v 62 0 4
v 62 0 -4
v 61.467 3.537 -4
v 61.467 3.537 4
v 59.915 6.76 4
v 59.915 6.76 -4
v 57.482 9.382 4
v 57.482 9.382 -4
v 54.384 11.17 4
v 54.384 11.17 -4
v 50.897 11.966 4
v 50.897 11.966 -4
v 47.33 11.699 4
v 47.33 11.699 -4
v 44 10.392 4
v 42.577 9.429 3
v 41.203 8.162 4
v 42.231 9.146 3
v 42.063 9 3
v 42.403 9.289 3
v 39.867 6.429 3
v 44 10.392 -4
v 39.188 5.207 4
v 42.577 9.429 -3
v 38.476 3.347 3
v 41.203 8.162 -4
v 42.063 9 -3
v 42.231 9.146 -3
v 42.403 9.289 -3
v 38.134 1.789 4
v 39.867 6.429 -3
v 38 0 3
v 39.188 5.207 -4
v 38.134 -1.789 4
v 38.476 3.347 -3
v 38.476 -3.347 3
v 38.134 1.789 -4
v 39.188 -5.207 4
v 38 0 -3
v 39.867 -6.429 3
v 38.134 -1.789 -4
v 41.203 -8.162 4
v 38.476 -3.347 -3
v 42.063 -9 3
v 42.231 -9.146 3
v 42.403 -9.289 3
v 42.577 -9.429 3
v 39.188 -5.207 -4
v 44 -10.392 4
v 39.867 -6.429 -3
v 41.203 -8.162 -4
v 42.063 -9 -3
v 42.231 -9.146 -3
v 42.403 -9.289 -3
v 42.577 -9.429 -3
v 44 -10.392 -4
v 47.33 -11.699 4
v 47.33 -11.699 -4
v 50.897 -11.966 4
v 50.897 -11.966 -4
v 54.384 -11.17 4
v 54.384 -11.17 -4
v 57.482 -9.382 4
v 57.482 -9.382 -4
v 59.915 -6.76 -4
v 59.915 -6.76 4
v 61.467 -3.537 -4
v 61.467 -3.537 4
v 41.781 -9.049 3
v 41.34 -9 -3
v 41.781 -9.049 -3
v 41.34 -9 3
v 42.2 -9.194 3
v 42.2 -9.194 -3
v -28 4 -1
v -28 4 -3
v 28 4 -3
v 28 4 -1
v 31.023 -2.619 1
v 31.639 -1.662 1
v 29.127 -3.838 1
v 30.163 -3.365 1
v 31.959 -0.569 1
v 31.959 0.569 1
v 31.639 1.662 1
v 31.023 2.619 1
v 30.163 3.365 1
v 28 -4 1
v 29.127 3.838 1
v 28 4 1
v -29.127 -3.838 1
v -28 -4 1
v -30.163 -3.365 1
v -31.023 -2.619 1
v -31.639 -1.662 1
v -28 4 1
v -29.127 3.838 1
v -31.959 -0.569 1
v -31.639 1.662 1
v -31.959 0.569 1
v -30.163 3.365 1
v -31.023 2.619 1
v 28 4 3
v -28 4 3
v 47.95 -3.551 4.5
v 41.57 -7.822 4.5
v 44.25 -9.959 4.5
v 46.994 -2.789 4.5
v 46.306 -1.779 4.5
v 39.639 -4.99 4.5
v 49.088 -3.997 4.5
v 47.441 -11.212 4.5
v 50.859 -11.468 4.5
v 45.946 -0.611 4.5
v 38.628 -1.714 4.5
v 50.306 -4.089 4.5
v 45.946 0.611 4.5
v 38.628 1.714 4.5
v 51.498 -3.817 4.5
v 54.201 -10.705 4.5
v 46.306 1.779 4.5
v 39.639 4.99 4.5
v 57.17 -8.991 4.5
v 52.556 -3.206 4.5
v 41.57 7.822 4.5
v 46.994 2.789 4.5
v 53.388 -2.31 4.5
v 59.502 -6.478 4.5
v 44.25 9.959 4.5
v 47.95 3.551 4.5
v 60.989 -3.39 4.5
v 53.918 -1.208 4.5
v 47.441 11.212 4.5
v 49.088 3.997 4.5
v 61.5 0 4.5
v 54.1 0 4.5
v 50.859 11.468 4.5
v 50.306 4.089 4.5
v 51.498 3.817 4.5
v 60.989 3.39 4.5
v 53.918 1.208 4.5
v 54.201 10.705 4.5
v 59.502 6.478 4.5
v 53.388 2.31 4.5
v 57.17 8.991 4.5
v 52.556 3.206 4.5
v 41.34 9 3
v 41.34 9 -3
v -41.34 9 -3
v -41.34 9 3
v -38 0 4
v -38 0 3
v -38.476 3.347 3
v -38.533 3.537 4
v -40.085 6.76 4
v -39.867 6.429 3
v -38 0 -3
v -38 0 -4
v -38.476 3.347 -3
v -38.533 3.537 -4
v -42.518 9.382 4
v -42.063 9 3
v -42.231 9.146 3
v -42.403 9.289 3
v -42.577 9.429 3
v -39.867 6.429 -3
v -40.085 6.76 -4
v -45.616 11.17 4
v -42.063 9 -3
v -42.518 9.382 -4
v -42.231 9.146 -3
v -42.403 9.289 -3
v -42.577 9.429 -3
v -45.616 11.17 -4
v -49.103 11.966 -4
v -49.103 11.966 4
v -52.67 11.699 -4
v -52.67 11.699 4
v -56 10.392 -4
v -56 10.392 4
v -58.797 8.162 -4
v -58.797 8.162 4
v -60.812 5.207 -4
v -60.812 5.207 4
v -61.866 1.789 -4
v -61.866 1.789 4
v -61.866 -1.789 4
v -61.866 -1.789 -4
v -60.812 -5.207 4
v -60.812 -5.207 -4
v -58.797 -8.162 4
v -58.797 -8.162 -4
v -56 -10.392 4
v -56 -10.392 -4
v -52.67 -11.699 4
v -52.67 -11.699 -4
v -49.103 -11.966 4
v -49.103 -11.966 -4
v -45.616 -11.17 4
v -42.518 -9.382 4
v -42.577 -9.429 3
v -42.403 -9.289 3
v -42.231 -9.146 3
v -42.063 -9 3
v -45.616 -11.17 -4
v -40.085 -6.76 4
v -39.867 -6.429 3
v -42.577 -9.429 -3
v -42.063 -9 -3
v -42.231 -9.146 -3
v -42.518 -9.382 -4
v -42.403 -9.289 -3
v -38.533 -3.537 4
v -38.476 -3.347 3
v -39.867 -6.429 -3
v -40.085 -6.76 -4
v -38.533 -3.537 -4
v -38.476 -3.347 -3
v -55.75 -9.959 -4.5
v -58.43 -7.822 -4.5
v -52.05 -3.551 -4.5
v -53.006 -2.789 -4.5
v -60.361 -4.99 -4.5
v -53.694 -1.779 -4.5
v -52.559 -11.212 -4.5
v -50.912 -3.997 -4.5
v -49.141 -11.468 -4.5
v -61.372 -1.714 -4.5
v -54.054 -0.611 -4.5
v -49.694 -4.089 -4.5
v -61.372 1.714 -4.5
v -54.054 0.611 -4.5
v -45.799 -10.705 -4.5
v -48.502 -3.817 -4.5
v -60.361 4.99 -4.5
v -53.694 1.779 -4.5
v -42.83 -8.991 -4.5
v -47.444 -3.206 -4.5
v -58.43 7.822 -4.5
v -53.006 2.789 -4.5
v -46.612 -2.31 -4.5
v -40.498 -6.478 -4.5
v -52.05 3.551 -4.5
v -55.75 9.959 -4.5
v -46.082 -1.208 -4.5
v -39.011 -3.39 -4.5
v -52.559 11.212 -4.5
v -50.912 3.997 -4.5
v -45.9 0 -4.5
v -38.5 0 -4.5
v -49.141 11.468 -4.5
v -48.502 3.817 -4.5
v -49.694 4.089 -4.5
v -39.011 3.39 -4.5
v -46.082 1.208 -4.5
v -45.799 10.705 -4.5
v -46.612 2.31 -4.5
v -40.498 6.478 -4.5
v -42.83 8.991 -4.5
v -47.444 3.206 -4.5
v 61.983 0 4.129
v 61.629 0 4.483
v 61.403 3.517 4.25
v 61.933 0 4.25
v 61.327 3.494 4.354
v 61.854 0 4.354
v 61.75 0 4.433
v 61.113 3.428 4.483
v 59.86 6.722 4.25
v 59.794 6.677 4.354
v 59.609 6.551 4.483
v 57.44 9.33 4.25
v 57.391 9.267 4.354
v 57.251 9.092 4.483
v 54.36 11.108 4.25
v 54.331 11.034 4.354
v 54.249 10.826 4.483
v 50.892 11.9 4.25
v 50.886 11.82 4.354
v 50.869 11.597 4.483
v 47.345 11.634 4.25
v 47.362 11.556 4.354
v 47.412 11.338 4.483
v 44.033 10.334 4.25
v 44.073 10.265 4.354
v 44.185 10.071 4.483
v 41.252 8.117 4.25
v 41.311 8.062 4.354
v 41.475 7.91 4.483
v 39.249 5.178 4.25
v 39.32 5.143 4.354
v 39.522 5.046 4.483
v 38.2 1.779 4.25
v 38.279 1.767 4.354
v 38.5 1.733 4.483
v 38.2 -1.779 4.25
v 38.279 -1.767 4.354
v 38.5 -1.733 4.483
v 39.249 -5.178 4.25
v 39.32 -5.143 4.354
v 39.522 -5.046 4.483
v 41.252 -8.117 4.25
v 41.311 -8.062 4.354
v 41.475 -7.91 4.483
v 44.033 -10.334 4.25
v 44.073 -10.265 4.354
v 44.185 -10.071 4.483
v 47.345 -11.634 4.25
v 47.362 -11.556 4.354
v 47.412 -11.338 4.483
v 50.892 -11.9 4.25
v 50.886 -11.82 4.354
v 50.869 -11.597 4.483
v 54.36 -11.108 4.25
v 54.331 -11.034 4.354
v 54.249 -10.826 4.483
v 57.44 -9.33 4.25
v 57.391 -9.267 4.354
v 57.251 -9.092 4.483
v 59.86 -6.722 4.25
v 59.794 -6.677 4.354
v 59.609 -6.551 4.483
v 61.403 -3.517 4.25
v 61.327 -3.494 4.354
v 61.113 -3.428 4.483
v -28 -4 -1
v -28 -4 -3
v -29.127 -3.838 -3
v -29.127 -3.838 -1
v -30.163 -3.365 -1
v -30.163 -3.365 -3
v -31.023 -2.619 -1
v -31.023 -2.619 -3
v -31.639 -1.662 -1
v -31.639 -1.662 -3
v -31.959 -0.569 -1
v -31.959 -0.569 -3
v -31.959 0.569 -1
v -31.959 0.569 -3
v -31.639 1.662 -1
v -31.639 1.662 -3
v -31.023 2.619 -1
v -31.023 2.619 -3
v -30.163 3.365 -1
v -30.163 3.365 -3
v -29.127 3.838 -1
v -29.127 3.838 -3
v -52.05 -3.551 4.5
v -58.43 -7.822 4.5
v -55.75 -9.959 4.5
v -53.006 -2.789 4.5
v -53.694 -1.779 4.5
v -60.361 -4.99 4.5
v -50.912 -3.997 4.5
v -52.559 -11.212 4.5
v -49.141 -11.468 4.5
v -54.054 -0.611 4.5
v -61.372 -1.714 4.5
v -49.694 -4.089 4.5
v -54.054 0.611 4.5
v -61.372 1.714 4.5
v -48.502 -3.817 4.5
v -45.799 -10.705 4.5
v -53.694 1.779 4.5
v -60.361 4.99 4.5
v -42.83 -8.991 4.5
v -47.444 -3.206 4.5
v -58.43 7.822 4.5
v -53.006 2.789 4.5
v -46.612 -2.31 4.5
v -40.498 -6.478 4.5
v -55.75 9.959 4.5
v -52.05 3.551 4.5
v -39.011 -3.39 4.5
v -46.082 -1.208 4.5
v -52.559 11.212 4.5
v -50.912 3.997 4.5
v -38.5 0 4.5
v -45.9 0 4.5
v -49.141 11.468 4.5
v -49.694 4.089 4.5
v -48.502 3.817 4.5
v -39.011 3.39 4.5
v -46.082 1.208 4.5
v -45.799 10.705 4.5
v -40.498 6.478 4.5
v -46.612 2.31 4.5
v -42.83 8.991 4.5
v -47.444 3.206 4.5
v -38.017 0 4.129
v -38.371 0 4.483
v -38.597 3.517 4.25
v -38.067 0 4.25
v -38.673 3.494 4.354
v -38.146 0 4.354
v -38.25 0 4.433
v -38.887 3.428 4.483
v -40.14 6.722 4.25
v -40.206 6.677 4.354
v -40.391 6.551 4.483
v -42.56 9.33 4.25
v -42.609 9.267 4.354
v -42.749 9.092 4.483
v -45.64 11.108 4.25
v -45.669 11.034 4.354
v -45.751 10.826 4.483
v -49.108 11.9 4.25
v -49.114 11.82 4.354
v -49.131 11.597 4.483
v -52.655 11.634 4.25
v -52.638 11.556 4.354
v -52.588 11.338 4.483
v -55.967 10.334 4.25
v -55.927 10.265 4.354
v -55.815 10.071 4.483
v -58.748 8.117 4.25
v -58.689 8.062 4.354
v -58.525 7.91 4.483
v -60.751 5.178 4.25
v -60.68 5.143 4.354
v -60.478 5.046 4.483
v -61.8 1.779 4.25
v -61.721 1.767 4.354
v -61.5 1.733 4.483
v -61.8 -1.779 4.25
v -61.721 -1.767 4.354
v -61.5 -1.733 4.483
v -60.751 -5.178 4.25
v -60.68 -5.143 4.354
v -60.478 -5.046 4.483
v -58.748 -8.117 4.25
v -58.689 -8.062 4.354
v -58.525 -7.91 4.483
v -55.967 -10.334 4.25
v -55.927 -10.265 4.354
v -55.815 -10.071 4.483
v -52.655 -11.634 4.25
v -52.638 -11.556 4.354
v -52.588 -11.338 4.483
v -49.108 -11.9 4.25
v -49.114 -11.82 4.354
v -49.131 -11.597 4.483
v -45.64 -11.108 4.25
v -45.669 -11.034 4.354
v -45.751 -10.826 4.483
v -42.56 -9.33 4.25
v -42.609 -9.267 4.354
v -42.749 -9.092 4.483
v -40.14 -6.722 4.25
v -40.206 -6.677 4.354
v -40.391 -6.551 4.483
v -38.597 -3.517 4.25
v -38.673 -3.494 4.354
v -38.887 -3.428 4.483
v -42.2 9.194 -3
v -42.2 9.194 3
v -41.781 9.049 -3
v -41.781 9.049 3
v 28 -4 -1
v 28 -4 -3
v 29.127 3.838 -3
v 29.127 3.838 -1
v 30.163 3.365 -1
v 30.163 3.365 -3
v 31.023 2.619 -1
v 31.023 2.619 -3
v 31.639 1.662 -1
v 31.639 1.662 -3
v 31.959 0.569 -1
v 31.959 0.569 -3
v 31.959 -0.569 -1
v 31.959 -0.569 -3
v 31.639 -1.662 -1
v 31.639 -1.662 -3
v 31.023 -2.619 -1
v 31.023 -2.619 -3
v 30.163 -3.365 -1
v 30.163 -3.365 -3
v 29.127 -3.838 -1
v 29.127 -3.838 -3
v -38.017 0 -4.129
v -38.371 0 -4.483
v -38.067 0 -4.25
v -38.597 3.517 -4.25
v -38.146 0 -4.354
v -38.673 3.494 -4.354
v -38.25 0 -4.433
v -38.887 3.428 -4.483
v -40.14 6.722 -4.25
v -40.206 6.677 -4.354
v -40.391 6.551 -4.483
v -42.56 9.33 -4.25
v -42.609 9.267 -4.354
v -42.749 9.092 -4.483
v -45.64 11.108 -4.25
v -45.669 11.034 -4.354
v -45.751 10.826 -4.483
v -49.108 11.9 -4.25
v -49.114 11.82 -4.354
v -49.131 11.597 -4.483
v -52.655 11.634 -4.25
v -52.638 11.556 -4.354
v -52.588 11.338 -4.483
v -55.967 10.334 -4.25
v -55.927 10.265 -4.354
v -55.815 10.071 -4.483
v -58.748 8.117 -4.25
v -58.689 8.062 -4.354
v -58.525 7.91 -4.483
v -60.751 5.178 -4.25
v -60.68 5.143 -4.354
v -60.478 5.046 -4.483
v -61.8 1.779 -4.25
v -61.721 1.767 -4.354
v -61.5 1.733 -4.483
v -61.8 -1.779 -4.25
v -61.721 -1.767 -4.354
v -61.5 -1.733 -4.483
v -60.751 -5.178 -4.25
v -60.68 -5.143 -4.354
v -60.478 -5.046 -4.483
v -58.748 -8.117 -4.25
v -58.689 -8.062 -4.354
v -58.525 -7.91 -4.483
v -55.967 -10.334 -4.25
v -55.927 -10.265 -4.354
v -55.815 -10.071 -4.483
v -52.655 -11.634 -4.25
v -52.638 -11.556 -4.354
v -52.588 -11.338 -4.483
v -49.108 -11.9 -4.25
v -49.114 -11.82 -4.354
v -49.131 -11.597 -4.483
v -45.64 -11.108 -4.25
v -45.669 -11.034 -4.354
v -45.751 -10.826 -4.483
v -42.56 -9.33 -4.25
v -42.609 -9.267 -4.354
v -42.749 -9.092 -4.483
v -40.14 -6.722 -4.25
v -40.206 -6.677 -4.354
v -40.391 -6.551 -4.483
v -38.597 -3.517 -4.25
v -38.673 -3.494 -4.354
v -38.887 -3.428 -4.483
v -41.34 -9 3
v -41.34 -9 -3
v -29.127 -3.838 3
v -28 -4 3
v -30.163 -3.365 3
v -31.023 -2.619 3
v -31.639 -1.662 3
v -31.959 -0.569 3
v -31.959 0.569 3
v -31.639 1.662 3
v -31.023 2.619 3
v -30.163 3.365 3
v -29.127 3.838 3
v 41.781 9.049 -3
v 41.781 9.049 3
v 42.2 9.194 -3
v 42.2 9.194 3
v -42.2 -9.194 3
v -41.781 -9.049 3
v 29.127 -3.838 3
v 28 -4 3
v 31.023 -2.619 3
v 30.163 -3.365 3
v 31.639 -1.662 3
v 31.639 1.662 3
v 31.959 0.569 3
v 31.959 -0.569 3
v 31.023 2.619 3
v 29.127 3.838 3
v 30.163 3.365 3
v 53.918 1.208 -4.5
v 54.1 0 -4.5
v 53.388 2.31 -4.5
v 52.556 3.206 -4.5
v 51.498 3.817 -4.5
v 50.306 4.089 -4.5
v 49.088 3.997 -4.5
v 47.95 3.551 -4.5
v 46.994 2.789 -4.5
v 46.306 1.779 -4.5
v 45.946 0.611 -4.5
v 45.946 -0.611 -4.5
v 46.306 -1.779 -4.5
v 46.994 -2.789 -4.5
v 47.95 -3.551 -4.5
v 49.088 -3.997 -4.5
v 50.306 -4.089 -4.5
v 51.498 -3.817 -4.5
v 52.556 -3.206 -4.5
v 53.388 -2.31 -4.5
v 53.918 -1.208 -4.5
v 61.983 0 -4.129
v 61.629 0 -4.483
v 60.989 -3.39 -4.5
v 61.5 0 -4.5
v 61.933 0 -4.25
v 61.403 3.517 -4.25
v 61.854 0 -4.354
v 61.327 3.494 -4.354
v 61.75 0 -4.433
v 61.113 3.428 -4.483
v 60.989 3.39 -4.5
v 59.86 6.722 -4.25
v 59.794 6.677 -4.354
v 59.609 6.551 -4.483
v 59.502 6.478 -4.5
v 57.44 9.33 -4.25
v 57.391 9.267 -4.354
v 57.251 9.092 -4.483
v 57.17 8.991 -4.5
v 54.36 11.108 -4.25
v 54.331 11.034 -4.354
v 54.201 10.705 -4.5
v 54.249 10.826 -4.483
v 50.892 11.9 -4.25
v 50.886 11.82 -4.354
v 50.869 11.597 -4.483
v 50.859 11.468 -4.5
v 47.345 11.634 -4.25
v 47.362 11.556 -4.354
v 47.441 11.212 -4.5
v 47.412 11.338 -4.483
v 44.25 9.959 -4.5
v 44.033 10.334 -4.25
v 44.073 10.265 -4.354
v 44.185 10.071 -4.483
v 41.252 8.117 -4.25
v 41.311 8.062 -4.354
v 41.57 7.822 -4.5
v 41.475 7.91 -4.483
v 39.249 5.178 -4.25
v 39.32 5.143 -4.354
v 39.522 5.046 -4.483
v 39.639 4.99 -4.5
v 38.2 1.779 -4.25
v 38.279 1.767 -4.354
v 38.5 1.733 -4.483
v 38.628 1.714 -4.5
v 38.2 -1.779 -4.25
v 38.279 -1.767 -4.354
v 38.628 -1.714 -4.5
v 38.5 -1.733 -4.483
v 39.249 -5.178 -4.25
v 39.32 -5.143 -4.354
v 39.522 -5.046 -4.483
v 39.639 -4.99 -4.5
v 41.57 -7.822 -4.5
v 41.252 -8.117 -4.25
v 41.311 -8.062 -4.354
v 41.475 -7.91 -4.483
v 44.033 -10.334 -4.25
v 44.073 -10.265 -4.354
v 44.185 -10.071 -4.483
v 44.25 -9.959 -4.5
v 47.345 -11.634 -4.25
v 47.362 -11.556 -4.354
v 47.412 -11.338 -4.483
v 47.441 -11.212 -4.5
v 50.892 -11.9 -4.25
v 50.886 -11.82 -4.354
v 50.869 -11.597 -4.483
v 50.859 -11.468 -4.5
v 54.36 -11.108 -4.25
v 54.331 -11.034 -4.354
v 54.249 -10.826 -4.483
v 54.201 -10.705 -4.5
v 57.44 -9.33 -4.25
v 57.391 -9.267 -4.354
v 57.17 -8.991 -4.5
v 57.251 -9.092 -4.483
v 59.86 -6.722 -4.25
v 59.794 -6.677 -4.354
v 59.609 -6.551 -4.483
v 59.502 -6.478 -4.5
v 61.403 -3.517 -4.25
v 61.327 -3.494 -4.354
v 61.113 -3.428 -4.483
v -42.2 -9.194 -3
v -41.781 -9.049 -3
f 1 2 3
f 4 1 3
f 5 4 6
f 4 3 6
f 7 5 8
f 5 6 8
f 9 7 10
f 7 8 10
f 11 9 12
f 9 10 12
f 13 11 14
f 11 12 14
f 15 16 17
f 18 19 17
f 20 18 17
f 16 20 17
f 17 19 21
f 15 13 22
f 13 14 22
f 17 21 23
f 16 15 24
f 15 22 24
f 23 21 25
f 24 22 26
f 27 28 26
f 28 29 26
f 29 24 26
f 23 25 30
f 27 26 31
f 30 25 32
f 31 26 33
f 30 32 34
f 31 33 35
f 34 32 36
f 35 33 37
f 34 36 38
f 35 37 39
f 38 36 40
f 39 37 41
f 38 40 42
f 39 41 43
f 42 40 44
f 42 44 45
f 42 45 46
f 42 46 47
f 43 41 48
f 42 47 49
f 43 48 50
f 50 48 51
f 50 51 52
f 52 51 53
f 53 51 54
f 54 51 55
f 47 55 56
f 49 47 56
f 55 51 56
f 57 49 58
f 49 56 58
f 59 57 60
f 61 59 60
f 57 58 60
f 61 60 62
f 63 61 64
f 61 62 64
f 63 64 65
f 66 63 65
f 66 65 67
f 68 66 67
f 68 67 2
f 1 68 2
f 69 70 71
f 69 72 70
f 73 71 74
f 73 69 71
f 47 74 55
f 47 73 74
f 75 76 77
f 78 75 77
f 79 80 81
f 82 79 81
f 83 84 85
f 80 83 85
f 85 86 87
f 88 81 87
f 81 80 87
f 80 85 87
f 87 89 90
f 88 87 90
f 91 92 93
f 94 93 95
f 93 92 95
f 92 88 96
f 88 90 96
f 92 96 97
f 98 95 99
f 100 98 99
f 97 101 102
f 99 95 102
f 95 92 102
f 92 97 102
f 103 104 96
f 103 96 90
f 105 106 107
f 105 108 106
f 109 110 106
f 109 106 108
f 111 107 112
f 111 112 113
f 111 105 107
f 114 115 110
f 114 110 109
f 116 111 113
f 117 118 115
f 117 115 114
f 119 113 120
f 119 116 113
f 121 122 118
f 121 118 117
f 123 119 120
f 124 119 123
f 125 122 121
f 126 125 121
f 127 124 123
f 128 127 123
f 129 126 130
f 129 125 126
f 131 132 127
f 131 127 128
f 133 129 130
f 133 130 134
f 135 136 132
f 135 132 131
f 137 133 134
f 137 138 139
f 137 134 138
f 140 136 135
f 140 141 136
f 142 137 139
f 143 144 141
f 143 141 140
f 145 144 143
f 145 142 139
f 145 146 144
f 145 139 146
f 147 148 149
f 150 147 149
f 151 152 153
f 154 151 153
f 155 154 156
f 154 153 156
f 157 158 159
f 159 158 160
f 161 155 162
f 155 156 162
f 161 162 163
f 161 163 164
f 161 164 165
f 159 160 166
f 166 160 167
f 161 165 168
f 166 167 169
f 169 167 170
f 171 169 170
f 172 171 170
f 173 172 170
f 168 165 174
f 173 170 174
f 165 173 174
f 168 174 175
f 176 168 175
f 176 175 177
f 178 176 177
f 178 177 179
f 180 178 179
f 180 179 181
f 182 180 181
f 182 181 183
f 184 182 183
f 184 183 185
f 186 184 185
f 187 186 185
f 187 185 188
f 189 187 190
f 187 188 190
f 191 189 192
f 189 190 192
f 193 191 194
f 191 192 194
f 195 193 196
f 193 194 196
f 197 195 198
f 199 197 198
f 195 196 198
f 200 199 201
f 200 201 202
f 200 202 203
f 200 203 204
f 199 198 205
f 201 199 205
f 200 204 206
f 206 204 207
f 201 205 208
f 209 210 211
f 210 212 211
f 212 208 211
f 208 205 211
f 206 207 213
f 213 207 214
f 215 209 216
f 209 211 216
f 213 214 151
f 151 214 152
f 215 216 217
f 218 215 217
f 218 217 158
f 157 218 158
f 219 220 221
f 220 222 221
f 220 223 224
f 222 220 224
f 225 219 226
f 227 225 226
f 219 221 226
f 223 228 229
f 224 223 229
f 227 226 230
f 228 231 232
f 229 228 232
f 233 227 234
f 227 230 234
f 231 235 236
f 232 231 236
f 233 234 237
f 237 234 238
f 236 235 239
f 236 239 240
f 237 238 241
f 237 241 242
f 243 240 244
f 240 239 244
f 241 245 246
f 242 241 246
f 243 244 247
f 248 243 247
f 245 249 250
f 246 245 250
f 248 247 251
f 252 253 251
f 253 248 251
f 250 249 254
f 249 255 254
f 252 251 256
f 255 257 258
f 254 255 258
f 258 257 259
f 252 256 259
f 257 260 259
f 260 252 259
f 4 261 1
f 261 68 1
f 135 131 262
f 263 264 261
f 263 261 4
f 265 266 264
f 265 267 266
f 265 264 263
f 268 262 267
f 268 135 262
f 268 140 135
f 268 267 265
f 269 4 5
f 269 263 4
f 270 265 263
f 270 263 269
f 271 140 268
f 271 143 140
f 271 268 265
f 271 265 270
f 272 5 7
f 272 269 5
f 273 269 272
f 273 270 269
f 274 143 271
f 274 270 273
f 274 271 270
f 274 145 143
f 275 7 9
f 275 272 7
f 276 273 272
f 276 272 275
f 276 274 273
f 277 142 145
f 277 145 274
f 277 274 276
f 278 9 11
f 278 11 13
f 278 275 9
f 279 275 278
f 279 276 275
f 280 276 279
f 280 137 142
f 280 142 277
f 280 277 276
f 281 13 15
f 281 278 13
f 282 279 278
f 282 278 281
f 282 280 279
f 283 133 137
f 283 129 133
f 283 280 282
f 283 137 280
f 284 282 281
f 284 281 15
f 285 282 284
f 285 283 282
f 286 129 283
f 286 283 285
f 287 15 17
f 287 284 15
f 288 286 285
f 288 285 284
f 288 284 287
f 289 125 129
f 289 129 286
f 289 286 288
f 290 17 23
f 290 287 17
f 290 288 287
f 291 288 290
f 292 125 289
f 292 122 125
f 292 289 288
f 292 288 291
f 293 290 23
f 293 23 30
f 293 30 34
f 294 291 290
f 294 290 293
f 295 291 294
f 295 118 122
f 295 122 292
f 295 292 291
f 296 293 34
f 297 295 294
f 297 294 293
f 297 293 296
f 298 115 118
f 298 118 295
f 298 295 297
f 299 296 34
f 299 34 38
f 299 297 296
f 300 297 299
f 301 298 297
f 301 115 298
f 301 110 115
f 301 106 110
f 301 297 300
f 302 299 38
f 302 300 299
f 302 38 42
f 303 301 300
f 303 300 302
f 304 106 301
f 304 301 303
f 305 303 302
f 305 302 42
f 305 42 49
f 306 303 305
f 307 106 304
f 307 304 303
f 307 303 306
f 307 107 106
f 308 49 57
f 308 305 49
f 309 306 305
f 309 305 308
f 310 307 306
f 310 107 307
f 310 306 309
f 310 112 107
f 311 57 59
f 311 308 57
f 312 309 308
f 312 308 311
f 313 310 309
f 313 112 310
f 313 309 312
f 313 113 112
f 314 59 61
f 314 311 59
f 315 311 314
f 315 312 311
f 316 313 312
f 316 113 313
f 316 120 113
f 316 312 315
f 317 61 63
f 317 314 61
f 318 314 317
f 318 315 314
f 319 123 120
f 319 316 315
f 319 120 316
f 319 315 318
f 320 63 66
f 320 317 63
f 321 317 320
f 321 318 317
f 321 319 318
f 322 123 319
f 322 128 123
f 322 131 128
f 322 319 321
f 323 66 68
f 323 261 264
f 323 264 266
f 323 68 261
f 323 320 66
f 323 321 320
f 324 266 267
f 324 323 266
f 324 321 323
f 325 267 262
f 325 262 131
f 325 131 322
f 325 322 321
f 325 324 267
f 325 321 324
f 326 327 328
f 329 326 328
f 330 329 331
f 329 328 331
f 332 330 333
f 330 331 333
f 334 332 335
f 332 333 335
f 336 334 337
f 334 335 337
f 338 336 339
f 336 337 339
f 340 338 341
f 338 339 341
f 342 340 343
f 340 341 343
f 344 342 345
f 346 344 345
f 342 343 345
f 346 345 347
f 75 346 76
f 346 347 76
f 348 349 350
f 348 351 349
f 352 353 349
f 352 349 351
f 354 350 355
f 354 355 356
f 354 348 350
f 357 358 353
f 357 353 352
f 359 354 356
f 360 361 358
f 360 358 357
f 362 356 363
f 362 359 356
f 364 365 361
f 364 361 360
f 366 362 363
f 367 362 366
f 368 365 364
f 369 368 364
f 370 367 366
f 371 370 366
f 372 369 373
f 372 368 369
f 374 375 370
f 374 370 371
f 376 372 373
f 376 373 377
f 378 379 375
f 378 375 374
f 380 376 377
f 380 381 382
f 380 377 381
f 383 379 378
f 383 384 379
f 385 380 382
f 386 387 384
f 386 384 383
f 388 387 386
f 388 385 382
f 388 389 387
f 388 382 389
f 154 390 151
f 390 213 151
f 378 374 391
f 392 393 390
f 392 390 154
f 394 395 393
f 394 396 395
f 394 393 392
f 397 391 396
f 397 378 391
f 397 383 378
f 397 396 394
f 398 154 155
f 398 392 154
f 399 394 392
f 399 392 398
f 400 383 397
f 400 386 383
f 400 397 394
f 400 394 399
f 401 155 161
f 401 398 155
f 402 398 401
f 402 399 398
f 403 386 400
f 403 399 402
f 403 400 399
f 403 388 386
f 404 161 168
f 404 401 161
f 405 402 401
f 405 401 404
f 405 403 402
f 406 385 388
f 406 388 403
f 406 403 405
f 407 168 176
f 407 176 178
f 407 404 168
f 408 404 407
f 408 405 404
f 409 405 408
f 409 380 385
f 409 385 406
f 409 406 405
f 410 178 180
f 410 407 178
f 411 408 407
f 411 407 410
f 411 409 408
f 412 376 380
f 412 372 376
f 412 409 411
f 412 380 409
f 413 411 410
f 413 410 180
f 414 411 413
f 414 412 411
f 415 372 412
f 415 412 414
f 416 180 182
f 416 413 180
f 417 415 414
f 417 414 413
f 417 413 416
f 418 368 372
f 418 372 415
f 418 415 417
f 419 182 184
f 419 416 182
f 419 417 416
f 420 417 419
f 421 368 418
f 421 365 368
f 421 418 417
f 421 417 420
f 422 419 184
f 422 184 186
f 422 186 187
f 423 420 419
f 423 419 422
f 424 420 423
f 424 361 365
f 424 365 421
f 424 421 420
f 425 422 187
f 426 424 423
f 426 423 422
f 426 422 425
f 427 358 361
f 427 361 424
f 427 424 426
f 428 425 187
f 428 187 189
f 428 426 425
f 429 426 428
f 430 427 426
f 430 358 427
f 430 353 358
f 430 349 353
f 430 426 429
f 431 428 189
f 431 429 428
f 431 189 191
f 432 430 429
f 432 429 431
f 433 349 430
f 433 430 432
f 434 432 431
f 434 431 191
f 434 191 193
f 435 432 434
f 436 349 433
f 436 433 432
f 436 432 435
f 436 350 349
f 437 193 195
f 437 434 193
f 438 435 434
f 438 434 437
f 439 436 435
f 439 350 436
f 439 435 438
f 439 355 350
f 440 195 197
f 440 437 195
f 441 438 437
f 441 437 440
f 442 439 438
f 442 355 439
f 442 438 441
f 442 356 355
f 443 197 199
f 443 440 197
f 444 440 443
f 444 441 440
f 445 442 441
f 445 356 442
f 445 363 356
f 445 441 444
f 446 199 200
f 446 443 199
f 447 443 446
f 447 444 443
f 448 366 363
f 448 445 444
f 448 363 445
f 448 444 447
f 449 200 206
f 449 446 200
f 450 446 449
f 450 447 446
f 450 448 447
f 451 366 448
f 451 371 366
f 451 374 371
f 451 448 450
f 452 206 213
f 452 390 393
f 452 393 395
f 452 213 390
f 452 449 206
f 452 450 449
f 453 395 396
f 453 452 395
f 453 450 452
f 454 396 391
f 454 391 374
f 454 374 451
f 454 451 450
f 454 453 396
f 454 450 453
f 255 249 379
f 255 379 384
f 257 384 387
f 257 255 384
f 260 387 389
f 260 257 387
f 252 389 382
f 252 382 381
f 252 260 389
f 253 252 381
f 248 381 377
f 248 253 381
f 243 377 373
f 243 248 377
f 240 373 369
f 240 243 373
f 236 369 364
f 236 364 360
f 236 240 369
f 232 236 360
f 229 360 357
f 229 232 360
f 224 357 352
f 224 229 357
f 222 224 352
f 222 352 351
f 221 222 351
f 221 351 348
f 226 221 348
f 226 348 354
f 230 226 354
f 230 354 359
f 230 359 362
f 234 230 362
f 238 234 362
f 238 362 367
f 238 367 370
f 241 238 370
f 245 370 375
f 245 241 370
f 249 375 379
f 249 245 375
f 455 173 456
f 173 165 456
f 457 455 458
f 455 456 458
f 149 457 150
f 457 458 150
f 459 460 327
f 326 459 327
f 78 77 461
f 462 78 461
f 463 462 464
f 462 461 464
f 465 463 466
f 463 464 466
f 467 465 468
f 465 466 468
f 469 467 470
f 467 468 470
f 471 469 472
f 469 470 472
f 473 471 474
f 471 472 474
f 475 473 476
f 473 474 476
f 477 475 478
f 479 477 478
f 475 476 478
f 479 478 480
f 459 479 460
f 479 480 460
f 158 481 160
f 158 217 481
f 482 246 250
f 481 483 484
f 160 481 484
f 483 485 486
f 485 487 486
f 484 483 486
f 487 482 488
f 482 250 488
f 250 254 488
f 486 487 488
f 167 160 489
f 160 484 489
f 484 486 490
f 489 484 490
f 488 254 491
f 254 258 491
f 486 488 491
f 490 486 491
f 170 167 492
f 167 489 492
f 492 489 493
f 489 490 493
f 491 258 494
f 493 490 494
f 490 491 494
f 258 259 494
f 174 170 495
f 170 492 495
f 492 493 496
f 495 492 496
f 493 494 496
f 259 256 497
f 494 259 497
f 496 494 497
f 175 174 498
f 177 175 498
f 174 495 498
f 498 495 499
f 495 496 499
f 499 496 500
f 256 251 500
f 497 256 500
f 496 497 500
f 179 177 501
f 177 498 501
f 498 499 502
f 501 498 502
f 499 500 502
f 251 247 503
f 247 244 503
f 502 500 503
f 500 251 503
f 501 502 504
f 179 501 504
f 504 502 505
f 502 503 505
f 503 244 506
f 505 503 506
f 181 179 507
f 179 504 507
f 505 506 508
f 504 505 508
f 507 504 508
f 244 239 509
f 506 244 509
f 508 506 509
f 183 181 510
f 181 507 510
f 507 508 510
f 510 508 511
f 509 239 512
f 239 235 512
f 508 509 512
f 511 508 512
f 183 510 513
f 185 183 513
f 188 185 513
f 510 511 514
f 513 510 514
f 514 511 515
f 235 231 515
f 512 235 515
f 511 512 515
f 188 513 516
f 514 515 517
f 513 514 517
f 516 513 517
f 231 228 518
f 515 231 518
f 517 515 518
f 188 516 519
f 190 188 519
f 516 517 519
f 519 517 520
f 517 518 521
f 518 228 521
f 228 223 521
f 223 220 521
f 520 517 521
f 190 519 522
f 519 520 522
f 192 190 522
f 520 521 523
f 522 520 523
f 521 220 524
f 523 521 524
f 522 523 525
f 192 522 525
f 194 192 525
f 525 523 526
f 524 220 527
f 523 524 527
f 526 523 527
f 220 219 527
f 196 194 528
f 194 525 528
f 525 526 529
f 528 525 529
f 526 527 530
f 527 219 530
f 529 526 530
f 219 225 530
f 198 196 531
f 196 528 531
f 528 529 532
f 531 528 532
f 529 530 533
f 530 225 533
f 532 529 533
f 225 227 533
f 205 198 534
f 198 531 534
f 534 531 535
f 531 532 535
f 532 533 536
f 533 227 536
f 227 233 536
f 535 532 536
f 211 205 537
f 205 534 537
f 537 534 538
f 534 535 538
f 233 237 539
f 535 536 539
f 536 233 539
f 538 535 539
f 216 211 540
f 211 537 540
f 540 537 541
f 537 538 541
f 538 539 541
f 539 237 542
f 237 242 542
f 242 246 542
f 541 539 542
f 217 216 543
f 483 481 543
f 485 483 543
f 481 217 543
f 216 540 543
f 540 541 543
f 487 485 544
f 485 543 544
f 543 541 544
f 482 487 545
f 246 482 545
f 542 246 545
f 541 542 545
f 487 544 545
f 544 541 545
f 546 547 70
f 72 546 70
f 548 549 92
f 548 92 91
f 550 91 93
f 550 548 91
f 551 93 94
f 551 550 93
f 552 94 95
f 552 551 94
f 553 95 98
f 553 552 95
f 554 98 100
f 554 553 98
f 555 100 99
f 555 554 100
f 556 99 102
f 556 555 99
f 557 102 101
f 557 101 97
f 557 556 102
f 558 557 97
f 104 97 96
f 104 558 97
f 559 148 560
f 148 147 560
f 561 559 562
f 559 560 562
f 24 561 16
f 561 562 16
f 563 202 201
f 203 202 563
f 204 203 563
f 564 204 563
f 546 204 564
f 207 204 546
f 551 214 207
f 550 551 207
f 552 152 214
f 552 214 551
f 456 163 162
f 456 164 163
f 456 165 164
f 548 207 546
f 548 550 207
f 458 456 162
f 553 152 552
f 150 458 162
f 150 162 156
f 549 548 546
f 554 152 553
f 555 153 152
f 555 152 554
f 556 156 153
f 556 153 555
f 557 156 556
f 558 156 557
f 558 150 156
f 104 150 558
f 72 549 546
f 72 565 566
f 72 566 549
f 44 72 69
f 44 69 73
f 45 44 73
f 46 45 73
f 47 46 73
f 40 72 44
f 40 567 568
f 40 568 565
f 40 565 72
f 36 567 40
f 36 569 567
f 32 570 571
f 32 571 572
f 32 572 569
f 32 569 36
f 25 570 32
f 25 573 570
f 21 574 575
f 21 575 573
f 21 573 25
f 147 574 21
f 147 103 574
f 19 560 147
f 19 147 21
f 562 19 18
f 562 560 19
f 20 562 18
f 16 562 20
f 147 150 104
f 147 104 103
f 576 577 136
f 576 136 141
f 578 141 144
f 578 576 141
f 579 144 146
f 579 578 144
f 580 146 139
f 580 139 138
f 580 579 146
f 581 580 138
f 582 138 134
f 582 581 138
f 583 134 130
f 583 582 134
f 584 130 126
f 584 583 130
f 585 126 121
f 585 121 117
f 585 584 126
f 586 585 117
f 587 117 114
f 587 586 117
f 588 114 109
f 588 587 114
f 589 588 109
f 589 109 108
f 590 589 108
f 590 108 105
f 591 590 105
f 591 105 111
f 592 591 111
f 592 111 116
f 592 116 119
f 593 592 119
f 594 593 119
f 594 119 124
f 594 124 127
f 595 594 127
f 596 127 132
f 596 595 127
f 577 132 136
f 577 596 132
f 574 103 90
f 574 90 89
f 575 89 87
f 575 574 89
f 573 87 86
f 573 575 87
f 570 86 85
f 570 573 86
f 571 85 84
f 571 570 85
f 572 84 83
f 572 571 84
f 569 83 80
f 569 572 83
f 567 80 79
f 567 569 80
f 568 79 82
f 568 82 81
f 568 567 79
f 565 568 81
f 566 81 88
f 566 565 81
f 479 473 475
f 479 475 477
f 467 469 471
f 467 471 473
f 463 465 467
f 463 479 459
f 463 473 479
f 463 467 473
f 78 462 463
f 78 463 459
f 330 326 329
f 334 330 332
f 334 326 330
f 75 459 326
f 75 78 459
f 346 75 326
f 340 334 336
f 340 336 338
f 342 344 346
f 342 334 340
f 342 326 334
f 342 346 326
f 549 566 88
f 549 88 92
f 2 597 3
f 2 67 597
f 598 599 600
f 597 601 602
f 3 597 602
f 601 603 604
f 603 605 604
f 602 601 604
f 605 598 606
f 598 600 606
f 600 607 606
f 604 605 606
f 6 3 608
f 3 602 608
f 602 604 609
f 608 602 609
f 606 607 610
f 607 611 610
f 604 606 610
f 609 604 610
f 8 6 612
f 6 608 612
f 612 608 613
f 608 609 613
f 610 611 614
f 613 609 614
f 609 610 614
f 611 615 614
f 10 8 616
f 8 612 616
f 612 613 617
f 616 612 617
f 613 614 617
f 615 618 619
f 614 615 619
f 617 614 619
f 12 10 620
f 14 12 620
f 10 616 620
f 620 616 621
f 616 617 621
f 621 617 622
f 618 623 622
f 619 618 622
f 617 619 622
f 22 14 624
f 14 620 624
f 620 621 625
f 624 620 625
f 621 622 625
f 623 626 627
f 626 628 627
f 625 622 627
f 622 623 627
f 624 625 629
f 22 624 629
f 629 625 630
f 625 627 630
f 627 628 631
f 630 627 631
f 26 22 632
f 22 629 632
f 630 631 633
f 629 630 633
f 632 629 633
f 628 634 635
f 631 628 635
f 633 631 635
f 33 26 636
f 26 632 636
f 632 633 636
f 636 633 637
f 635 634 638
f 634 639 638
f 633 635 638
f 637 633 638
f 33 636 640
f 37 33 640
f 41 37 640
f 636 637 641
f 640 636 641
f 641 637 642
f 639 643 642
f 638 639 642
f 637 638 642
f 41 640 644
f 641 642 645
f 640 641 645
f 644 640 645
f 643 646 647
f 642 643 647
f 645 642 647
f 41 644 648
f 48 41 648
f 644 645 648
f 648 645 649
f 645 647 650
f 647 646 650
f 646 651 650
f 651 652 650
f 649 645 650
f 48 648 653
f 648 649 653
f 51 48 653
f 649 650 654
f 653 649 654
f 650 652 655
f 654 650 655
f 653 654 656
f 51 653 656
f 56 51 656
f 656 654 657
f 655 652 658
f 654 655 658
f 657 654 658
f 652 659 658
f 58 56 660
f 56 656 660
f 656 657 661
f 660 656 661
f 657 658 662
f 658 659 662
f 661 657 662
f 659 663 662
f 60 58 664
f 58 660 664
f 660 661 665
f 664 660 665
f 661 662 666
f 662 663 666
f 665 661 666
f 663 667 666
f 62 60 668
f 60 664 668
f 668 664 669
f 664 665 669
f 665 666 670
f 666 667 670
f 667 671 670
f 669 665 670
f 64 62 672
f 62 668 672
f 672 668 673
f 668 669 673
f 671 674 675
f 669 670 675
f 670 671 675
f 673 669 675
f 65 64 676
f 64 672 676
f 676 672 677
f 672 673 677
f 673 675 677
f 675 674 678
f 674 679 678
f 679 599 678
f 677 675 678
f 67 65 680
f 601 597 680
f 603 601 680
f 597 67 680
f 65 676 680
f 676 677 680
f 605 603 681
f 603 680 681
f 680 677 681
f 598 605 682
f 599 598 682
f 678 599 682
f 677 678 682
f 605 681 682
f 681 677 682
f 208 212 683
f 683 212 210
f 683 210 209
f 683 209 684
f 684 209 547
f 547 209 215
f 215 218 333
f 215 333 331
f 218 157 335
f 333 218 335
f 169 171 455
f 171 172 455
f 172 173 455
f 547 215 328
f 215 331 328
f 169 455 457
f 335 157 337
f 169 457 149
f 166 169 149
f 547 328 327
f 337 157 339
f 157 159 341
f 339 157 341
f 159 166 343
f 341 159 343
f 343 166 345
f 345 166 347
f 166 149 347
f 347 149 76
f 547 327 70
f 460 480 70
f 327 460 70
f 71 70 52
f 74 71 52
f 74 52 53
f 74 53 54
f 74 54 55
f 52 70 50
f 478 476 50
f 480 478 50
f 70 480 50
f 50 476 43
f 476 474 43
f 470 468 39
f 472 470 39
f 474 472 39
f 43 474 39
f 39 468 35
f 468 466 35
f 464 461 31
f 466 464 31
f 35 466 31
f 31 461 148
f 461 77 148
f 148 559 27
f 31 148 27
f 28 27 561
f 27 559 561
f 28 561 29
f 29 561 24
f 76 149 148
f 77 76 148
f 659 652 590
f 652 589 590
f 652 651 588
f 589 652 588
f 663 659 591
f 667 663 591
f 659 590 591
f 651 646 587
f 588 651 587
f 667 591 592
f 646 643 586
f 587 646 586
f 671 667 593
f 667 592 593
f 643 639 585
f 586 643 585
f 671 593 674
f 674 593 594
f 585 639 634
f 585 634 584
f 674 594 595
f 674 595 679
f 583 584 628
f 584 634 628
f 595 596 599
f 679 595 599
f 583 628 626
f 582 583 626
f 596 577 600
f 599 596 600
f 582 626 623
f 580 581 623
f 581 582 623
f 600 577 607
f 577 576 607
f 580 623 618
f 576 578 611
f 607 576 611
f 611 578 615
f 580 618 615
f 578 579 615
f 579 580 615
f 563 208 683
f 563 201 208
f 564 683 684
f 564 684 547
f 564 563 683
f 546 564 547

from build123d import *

# Parameters (mm, degrees)
EXTRUDE_1_DEPTH      = 3
EXTRUDE_1_DEPTH_BACK = 3
EXTRUDE_2_DEPTH      = 4.5
EXTRUDE_2_DEPTH_BACK = 4.5
SKETCH_1_3_R         = 12
SKETCH_1_3_R_2       = 4.1
FILLET_1_R           = 2
FILLET_2_R           = 0.5
CUT_EXTRUDE_1_DEPTH  = 2


with BuildPart() as part:
    # 草图1 → 凸台-拉伸1 (new, two sides: drawn at the far end of the back side and taken through both)
    with BuildSketch(Plane.XY.offset(-EXTRUDE_1_DEPTH_BACK)):
        with BuildLine():
            Line((42.062746067, 9), (-42.062746067, 9))
            ThreePointArc((-42.062746067, 9), (-39.062746067, 4.937253933), (-38, 0))
            ThreePointArc((-38, 0), (-39.062746067, -4.937253933), (-42.062746067, -9))
            Line((-42.062746067, -9), (42.062746067, -9))
            ThreePointArc((42.062746067, -9), (38, 0), (42.062746067, 9))
        make_face()
    extrude(amount=EXTRUDE_1_DEPTH + EXTRUDE_1_DEPTH_BACK)

    # 草图1<3> → 凸台-拉伸2 (add, two sides: drawn at the far end of the back side and taken through both)
    # profile 1 of 2: a face of its own
    with BuildSketch(Plane.XY.offset(-EXTRUDE_2_DEPTH_BACK)):
        with Locations((-50, 0)):
            Circle(SKETCH_1_3_R)
        with Locations((-50, 0)):
            Circle(SKETCH_1_3_R_2, mode=Mode.SUBTRACT)
    # profile 2 of 2: a face of its own
    with BuildSketch(Plane.XY.offset(-EXTRUDE_2_DEPTH_BACK)):
        with Locations((50, 0)):
            Circle(SKETCH_1_3_R)
        with Locations((50, 0)):
            Circle(SKETCH_1_3_R_2, mode=Mode.SUBTRACT)
    extrude(amount=EXTRUDE_2_DEPTH + EXTRUDE_2_DEPTH_BACK)

    # 圆角1
    fillet_1_edges = [part.edges().sort_by_distance(p)[0] for p in [
        (42.062746067, -9, -1.5),
        (-42.062746067, -9, -1.5),
        (-42.062746067, 9, -1.5),
        (42.062746067, 9, -1.5),
    ]]
    fillet(fillet_1_edges, radius=FILLET_1_R)

    # 圆角2
    fillet_2_edges = [part.edges().sort_by_distance(p)[0] for p in [
        (-62, 0, -4.5),
        (-62, 0, 4.5),
        (38, 0, -4.5),
        (38, 0, 4.5),
    ]]
    fillet(fillet_2_edges, radius=FILLET_2_R)

    # 草图2 → 切除-拉伸1 (cut)
    with BuildSketch(Plane.XY.offset(3)):
        with BuildLine():
            Line((-28, 4), (28, 4))
            ThreePointArc((28, 4), (32, 0), (28, -4))
            Line((28, -4), (-28, -4))
            ThreePointArc((-28, -4), (-32, 0), (-28, 4))
        make_face()
    cut_extrude_1 = extrude(amount=-CUT_EXTRUDE_1_DEPTH, mode=Mode.SUBTRACT)

    # 镜向1: 切除-拉伸1 across plane
    add(cut_extrude_1.mirror(Plane.XY), mode=Mode.SUBTRACT)


solid = part.part
